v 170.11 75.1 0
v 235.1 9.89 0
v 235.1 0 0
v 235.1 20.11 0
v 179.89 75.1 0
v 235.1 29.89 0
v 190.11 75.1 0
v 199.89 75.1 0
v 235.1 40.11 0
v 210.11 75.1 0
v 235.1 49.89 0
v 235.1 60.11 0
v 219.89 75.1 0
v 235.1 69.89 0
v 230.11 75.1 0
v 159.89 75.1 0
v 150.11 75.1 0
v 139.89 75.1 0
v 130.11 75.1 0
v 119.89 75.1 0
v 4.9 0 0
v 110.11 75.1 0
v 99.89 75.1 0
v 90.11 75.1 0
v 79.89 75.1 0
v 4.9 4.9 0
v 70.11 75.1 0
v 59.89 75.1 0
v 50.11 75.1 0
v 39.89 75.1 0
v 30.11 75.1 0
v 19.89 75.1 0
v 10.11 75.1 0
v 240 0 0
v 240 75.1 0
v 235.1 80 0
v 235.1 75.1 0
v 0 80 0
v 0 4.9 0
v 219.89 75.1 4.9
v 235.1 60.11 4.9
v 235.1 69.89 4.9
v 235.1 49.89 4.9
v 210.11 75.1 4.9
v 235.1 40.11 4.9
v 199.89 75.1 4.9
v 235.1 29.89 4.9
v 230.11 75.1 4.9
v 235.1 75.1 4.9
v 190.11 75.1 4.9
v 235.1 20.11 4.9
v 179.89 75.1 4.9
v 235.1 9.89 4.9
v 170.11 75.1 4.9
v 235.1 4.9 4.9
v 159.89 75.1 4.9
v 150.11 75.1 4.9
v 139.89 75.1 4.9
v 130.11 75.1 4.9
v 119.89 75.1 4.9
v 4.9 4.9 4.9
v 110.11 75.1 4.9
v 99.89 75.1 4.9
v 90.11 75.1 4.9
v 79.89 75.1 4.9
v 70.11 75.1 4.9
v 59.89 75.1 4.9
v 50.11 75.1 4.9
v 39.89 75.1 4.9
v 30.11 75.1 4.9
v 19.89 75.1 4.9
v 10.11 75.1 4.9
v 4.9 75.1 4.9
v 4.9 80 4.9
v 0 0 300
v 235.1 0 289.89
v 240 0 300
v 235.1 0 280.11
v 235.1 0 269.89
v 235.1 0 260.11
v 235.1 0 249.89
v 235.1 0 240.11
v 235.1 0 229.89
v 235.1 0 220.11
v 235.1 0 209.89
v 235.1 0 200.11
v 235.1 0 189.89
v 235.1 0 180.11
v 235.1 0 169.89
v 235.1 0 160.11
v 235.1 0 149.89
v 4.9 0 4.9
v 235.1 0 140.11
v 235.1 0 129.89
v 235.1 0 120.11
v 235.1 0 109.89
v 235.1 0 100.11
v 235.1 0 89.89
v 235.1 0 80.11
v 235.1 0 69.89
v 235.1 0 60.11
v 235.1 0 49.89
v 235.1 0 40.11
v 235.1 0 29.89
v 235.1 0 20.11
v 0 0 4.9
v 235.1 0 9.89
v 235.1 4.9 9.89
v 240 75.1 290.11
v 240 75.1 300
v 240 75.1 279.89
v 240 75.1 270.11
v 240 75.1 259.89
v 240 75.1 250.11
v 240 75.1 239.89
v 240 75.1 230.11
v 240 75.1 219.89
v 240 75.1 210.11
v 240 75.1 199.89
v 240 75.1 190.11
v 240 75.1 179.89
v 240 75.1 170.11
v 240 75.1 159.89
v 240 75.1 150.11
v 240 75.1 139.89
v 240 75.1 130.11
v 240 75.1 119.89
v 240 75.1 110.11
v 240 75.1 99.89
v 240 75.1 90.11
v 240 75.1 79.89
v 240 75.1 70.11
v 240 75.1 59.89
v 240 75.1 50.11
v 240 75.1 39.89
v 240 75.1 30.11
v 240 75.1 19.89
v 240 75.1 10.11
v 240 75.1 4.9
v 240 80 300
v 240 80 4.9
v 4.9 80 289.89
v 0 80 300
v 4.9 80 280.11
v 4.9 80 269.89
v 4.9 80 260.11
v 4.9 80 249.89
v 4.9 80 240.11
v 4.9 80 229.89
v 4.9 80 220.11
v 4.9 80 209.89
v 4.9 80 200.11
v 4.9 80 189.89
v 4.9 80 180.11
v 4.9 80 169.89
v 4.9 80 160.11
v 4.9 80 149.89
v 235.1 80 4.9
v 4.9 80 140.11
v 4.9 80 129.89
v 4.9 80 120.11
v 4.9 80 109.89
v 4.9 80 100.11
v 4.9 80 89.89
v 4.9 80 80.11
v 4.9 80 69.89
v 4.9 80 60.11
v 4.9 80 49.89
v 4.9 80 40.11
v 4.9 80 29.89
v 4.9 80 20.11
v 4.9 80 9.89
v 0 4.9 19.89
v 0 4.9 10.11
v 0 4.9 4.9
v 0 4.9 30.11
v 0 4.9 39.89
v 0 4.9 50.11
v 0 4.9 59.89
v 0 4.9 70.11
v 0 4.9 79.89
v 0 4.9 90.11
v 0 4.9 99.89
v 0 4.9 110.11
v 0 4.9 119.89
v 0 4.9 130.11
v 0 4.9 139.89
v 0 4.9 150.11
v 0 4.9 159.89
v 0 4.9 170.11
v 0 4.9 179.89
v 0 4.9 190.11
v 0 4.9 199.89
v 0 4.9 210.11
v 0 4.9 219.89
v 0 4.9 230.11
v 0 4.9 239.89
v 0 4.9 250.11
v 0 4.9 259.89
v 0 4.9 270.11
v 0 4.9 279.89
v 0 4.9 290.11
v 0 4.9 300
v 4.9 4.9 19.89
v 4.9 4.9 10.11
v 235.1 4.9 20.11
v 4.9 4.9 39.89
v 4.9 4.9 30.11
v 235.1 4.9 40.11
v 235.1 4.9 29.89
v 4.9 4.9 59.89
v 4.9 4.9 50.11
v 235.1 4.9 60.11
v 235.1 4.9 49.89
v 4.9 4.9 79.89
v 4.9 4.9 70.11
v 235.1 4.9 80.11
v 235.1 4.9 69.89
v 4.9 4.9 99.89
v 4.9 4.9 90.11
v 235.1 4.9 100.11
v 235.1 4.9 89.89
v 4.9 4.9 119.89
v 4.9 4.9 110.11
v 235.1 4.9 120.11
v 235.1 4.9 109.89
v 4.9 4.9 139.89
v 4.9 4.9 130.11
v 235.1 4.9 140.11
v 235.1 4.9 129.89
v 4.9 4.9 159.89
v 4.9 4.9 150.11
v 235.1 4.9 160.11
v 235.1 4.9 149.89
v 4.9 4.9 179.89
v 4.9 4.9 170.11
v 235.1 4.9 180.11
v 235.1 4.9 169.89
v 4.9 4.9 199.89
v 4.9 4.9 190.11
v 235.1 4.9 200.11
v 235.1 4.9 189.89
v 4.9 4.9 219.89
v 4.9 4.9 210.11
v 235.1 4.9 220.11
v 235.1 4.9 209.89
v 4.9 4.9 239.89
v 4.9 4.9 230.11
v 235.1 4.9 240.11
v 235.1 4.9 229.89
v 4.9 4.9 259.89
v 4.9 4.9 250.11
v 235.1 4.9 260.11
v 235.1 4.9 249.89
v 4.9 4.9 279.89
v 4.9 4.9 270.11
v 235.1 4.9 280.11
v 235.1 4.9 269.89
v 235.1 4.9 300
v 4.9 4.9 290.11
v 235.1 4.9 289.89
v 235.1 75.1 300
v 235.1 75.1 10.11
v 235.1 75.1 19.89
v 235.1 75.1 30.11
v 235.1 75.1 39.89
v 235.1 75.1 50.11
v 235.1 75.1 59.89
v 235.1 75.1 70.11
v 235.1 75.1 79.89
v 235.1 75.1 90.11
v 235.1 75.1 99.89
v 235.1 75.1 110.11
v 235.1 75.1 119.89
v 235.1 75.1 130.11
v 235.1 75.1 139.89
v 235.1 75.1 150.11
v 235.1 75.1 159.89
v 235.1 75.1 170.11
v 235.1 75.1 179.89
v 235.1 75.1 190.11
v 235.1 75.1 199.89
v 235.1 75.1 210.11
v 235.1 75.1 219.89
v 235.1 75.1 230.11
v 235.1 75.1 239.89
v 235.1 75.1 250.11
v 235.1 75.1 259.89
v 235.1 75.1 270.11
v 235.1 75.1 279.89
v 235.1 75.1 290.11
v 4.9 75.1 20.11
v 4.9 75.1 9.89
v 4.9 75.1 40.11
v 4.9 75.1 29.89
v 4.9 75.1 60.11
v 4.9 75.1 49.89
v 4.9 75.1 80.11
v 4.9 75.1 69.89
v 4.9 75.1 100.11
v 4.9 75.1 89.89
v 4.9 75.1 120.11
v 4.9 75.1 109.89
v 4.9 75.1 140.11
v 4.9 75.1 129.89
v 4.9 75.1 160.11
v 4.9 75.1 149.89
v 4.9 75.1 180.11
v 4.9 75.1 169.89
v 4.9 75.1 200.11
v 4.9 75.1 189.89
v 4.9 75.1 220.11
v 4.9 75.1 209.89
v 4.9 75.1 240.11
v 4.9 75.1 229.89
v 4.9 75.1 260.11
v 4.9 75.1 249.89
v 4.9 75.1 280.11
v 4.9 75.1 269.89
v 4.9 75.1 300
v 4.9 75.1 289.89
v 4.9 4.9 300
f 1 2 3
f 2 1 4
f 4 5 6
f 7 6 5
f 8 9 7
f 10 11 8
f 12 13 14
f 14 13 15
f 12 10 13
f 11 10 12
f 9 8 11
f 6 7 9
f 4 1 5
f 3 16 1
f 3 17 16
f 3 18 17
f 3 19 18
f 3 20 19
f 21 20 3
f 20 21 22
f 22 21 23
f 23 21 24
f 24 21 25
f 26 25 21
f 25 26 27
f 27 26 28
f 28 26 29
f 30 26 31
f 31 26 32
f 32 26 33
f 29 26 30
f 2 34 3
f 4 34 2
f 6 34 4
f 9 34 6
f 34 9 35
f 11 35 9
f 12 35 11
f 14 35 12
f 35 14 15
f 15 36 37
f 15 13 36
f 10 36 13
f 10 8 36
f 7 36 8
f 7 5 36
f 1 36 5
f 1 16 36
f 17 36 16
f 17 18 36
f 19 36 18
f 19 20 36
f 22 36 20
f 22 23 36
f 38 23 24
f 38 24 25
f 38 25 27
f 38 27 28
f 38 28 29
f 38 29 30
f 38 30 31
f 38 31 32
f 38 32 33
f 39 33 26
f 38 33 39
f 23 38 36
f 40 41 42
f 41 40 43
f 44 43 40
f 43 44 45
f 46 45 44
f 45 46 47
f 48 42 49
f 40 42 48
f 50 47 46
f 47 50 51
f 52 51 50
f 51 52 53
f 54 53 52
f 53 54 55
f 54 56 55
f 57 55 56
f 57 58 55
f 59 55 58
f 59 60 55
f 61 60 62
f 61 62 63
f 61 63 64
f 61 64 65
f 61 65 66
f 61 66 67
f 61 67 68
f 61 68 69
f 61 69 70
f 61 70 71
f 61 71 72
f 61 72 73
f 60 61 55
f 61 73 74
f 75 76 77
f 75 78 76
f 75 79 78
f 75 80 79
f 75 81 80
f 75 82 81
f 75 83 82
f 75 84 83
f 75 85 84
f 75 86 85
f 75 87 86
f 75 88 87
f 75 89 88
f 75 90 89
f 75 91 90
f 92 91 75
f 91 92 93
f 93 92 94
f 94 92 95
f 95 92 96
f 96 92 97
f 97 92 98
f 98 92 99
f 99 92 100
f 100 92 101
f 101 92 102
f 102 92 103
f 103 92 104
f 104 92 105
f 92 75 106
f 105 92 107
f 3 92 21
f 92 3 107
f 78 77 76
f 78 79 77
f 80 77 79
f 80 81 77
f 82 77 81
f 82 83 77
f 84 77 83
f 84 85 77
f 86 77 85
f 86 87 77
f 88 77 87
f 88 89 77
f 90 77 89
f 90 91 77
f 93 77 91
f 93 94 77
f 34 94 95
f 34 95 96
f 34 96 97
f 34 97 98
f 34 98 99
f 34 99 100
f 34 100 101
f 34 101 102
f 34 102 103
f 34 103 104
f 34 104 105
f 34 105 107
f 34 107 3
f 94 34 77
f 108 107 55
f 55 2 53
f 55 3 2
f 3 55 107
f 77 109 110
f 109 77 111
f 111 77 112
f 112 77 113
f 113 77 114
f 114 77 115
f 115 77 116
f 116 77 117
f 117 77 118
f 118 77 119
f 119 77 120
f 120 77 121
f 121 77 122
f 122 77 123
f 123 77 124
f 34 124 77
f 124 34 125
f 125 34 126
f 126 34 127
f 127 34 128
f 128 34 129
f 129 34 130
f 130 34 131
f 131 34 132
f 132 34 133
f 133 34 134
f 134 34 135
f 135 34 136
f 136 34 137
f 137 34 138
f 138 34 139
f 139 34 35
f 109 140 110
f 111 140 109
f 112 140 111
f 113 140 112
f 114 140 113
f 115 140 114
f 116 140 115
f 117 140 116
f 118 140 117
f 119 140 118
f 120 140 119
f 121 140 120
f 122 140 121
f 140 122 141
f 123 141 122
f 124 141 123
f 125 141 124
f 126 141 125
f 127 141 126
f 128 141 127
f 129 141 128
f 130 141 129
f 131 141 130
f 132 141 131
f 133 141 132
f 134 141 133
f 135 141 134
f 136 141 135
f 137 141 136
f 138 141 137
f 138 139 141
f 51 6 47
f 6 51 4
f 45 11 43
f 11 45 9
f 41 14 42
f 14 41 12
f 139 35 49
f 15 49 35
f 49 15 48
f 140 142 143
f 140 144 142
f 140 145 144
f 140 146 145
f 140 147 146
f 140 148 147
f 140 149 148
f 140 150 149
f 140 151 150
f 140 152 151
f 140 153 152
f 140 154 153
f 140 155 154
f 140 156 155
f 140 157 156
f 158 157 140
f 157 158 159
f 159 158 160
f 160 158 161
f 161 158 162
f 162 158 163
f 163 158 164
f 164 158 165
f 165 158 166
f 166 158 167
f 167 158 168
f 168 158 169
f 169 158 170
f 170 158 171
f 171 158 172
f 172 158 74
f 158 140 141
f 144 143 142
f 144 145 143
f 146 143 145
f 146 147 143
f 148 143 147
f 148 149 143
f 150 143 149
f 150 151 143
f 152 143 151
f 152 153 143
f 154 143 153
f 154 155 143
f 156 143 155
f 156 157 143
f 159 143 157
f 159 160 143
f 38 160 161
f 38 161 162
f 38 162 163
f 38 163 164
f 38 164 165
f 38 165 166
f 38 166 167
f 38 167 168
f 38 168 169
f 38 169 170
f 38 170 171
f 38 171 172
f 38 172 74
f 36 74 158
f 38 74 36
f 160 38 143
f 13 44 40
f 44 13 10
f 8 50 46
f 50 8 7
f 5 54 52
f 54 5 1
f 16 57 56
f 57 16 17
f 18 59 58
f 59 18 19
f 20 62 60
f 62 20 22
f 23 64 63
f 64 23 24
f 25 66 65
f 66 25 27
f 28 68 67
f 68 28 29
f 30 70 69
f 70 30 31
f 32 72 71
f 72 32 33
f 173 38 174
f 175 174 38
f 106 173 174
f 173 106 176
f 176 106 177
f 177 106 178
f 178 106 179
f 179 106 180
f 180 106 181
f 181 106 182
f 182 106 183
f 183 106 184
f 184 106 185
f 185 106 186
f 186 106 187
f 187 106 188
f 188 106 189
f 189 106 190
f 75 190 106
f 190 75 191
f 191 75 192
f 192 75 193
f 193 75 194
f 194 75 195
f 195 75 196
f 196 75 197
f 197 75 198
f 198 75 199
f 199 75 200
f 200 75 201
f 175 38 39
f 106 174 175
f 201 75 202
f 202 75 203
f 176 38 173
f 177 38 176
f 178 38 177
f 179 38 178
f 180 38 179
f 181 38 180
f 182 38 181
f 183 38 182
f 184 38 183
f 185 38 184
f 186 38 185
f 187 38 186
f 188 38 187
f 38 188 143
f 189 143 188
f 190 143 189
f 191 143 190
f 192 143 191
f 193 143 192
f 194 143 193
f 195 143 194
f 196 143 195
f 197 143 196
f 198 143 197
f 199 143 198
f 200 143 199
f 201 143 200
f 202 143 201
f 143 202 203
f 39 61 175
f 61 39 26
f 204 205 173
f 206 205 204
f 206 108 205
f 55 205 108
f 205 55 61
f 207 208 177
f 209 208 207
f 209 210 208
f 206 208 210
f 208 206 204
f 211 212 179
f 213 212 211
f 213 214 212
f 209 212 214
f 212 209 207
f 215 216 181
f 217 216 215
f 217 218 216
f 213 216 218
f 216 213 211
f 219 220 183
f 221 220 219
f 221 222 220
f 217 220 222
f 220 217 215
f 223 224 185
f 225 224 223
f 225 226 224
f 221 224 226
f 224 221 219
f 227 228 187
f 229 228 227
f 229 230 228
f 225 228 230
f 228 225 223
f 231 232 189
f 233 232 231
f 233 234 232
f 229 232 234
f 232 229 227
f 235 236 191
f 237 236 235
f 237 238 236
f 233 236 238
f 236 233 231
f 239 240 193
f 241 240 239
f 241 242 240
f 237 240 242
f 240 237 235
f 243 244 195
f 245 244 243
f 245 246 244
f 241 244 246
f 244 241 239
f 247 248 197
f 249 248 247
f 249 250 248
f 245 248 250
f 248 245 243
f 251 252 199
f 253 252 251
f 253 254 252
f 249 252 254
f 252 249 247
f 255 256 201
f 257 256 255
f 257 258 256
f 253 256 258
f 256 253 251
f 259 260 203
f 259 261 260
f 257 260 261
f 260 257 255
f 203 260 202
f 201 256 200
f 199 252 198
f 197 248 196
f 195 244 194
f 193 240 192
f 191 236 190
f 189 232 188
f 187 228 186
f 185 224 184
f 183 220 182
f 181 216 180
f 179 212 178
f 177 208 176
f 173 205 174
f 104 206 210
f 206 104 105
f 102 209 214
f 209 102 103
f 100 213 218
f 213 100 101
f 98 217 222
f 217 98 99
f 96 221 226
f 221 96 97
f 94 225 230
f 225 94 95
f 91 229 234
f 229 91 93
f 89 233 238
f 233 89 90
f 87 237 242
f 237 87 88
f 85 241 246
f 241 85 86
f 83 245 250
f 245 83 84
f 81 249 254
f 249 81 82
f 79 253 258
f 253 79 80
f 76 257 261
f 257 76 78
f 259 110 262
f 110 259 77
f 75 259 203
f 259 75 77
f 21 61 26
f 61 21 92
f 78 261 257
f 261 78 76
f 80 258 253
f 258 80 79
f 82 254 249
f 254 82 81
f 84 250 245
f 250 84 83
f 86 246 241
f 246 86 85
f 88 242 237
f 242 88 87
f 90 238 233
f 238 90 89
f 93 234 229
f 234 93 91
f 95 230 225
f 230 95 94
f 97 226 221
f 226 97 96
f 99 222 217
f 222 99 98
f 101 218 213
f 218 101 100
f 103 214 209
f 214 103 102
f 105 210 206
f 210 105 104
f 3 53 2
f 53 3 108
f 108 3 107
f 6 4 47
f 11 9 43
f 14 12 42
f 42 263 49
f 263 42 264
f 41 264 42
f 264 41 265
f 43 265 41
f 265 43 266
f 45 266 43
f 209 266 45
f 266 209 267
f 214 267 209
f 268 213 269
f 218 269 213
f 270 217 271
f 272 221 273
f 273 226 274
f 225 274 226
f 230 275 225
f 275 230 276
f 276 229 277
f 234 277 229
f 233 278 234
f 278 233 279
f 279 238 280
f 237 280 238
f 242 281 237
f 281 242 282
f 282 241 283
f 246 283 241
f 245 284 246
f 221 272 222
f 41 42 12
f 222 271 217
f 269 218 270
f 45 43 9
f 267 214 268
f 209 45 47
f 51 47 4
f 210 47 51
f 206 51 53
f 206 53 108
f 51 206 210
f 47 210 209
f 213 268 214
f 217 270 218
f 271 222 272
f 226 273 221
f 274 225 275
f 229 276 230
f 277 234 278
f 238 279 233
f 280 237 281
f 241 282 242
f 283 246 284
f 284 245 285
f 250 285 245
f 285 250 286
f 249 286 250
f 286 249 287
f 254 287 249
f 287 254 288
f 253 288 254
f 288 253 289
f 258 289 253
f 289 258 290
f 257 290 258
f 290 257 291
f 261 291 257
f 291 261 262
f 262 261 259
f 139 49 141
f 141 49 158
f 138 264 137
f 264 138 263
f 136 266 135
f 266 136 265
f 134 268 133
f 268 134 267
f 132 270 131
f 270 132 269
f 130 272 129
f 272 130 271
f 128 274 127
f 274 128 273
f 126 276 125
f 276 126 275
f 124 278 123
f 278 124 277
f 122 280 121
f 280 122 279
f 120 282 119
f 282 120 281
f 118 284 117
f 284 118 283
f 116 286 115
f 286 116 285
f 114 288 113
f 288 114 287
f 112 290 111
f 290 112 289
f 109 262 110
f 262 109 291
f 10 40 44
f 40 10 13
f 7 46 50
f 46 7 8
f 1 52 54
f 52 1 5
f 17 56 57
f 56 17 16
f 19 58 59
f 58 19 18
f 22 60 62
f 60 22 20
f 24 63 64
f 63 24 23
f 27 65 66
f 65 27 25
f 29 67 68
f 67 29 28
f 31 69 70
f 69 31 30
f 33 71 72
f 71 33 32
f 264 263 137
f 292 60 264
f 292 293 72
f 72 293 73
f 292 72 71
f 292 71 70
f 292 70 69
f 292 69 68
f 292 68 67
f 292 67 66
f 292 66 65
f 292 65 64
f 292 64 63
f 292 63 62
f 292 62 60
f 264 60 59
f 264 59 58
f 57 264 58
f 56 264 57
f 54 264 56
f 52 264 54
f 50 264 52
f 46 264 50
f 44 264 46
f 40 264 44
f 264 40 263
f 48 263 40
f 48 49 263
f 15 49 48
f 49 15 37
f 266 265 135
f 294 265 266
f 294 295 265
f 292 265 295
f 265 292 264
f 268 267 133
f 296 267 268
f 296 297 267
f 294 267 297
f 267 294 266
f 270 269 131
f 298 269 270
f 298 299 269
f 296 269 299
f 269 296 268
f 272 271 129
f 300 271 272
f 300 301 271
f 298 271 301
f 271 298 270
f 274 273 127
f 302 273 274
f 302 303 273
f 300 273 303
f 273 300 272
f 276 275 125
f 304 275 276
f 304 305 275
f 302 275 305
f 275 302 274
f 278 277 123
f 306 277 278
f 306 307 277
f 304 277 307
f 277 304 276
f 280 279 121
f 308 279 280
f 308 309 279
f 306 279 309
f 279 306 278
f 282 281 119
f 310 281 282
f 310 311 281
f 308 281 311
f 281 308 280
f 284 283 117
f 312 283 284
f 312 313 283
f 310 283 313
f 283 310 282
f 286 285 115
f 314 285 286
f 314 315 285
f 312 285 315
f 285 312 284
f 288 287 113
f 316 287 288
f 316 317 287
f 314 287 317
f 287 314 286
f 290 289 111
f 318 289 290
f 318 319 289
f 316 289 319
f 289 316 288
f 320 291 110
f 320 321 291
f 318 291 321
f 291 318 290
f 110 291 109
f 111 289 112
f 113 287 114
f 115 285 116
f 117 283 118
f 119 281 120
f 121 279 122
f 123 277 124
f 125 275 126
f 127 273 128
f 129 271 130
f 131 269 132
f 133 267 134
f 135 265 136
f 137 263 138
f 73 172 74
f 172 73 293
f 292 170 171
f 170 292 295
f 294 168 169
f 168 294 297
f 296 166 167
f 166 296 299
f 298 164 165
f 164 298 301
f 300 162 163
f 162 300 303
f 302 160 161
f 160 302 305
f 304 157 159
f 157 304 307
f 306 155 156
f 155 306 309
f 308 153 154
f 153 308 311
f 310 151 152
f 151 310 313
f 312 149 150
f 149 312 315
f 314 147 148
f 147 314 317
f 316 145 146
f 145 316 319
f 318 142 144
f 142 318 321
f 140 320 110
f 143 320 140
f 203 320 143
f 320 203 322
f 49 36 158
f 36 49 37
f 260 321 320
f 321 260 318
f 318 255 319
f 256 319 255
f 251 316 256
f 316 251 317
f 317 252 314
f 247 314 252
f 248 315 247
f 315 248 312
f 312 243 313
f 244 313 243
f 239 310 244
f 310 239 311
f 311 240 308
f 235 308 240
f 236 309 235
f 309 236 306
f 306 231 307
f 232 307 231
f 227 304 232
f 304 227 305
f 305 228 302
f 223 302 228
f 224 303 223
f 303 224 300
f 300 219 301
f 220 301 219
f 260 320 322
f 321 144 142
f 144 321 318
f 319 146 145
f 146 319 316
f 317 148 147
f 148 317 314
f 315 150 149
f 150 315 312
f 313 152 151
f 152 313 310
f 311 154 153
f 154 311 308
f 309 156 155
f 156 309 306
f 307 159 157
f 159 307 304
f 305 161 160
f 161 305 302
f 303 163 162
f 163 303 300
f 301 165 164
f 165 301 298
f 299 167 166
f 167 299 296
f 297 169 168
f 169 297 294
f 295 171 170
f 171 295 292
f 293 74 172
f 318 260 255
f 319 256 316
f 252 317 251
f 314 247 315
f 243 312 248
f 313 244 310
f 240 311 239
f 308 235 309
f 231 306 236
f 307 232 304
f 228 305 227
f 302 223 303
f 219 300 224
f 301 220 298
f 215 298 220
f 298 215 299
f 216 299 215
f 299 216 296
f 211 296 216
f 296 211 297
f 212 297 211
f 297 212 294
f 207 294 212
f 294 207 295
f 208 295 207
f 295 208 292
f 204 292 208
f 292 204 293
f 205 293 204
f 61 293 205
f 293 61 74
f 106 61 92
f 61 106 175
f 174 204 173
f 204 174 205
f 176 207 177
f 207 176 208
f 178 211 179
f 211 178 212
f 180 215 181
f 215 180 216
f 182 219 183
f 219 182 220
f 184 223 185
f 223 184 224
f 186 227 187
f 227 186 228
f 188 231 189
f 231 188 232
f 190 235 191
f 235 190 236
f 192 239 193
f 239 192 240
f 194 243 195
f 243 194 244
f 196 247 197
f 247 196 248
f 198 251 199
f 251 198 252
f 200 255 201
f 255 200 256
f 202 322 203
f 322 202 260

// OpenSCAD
union() {
	union() {
		linear_extrude(height = 4.9000000000) {
			union() {
				difference() {
					polygon(points = [[235.1000000000, 69.8900000000], [235.1000000000, 60.1100000000], [240.0000000000, 60.1100000000], [240.0000000000, 49.8900000000], [235.1000000000, 49.8900000000], [235.1000000000, 40.1100000000], [240.0000000000, 40.1100000000], [240.0000000000, 29.8900000000], [235.1000000000, 29.8900000000], [235.1000000000, 20.1100000000], [240.0000000000, 20.1100000000], [240.0000000000, 9.8900000000], [235.1000000000, 9.8900000000], [235.1000000000, 0.0000000000], [229.8900000000, 0.0000000000], [229.8900000000, 4.9000000000], [220.1100000000, 4.9000000000], [220.1100000000, 0.0000000000], [209.8900000000, 0.0000000000], [209.8900000000, 4.9000000000], [200.1100000000, 4.9000000000], [200.1100000000, 0.0000000000], [189.8900000000, 0.0000000000], [189.8900000000, 4.9000000000], [180.1100000000, 4.9000000000], [180.1100000000, 0.0000000000], [169.8900000000, 0.0000000000], [169.8900000000, 4.9000000000], [160.1100000000, 4.9000000000], [160.1100000000, 0.0000000000], [149.8900000000, 0.0000000000], [149.8900000000, 4.9000000000], [140.1100000000, 4.9000000000], [140.1100000000, 0.0000000000], [129.8900000000, 0.0000000000], [129.8900000000, 4.9000000000], [120.1100000000, 4.9000000000], [120.1100000000, 0.0000000000], [109.8900000000, 0.0000000000], [109.8900000000, 4.9000000000], [100.1100000000, 4.9000000000], [100.1100000000, 0.0000000000], [89.8900000000, 0.0000000000], [89.8900000000, 4.9000000000], [80.1100000000, 4.9000000000], [80.1100000000, 0.0000000000], [69.8900000000, 0.0000000000], [69.8900000000, 4.9000000000], [60.1100000000, 4.9000000000], [60.1100000000, 0.0000000000], [49.8900000000, 0.0000000000], [49.8900000000, 4.9000000000], [40.1100000000, 4.9000000000], [40.1100000000, 0.0000000000], [29.8900000000, 0.0000000000], [29.8900000000, 4.9000000000], [20.1100000000, 4.9000000000], [20.1100000000, 0.0000000000], [9.8900000000, 0.0000000000], [9.8900000000, 4.9000000000], [0.0000000000, 4.9000000000], [0.0000000000, 10.1100000000], [4.9000000000, 10.1100000000], [4.9000000000, 19.8900000000], [0.0000000000, 19.8900000000], [0.0000000000, 30.1100000000], [4.9000000000, 30.1100000000], [4.9000000000, 39.8900000000], [0.0000000000, 39.8900000000], [0.0000000000, 50.1100000000], [4.9000000000, 50.1100000000], [4.9000000000, 59.8900000000], [0.0000000000, 59.8900000000], [0.0000000000, 70.1100000000], [4.9000000000, 70.1100000000], [4.9000000000, 80.0000000000], [10.1100000000, 80.0000000000], [10.1100000000, 75.1000000000], [19.8900000000, 75.1000000000], [19.8900000000, 80.0000000000], [30.1100000000, 80.0000000000], [30.1100000000, 75.1000000000], [39.8900000000, 75.1000000000], [39.8900000000, 80.0000000000], [50.1100000000, 80.0000000000], [50.1100000000, 75.1000000000], [59.8900000000, 75.1000000000], [59.8900000000, 80.0000000000], [70.1100000000, 80.0000000000], [70.1100000000, 75.1000000000], [79.8900000000, 75.1000000000], [79.8900000000, 80.0000000000], [90.1100000000, 80.0000000000], [90.1100000000, 75.1000000000], [99.8900000000, 75.1000000000], [99.8900000000, 80.0000000000], [110.1100000000, 80.0000000000], [110.1100000000, 75.1000000000], [119.8900000000, 75.1000000000], [119.8900000000, 80.0000000000], [130.1100000000, 80.0000000000], [130.1100000000, 75.1000000000], [139.8900000000, 75.1000000000], [139.8900000000, 80.0000000000], [150.1100000000, 80.0000000000], [150.1100000000, 75.1000000000], [159.8900000000, 75.1000000000], [159.8900000000, 80.0000000000], [170.1100000000, 80.0000000000], [170.1100000000, 75.1000000000], [179.8900000000, 75.1000000000], [179.8900000000, 80.0000000000], [190.1100000000, 80.0000000000], [190.1100000000, 75.1000000000], [199.8900000000, 75.1000000000], [199.8900000000, 80.0000000000], [210.1100000000, 80.0000000000], [210.1100000000, 75.1000000000], [219.8900000000, 75.1000000000], [219.8900000000, 80.0000000000], [230.1100000000, 80.0000000000], [230.1100000000, 75.1000000000], [240.0000000000, 75.1000000000], [240.0000000000, 69.8900000000], [235.1000000000, 69.8900000000]]);
				}
			}
		}
	}
	union() {
		color(alpha = 1.0000000000, c = [0.8000000000, 0.5000000000, 0.2000000000]) {
			translate(v = [0, 4.9000000000, 0]) {
				rotate(a = 90, v = [1, 0, 0]) {
					linear_extrude(height = 4.9000000000) {
						union() {
							difference() {
								polygon(points = [[240.0000000000, 300.0000000000], [240.0000000000, 289.8900000000], [235.1000000000, 289.8900000000], [235.1000000000, 280.1100000000], [240.0000000000, 280.1100000000], [240.0000000000, 269.8900000000], [235.1000000000, 269.8900000000], [235.1000000000, 260.1100000000], [240.0000000000, 260.1100000000], [240.0000000000, 249.8900000000], [235.1000000000, 249.8900000000], [235.1000000000, 240.1100000000], [240.0000000000, 240.1100000000], [240.0000000000, 229.8900000000], [235.1000000000, 229.8900000000], [235.1000000000, 220.1100000000], [240.0000000000, 220.1100000000], [240.0000000000, 209.8900000000], [235.1000000000, 209.8900000000], [235.1000000000, 200.1100000000], [240.0000000000, 200.1100000000], [240.0000000000, 189.8900000000], [235.1000000000, 189.8900000000], [235.1000000000, 180.1100000000], [240.0000000000, 180.1100000000], [240.0000000000, 169.8900000000], [235.1000000000, 169.8900000000], [235.1000000000, 160.1100000000], [240.0000000000, 160.1100000000], [240.0000000000, 149.8900000000], [235.1000000000, 149.8900000000], [235.1000000000, 140.1100000000], [240.0000000000, 140.1100000000], [240.0000000000, 129.8900000000], [235.1000000000, 129.8900000000], [235.1000000000, 120.1100000000], [240.0000000000, 120.1100000000], [240.0000000000, 109.8900000000], [235.1000000000, 109.8900000000], [235.1000000000, 100.1100000000], [240.0000000000, 100.1100000000], [240.0000000000, 89.8900000000], [235.1000000000, 89.8900000000], [235.1000000000, 80.1100000000], [240.0000000000, 80.1100000000], [240.0000000000, 69.8900000000], [235.1000000000, 69.8900000000], [235.1000000000, 60.1100000000], [240.0000000000, 60.1100000000], [240.0000000000, 49.8900000000], [235.1000000000, 49.8900000000], [235.1000000000, 40.1100000000], [240.0000000000, 40.1100000000], [240.0000000000, 29.8900000000], [235.1000000000, 29.8900000000], [235.1000000000, 20.1100000000], [240.0000000000, 20.1100000000], [240.0000000000, 9.8900000000], [235.1000000000, 9.8900000000], [235.1000000000, 4.9000000000], [230.1100000000, 4.9000000000], [230.1100000000, 0.0000000000], [219.8900000000, 0.0000000000], [219.8900000000, 4.9000000000], [210.1100000000, 4.9000000000], [210.1100000000, 0.0000000000], [199.8900000000, 0.0000000000], [199.8900000000, 4.9000000000], [190.1100000000, 4.9000000000], [190.1100000000, 0.0000000000], [179.8900000000, 0.0000000000], [179.8900000000, 4.9000000000], [170.1100000000, 4.9000000000], [170.1100000000, 0.0000000000], [159.8900000000, 0.0000000000], [159.8900000000, 4.9000000000], [150.1100000000, 4.9000000000], [150.1100000000, 0.0000000000], [139.8900000000, 0.0000000000], [139.8900000000, 4.9000000000], [130.1100000000, 4.9000000000], [130.1100000000, 0.0000000000], [119.8900000000, 0.0000000000], [119.8900000000, 4.9000000000], [110.1100000000, 4.9000000000], [110.1100000000, 0.0000000000], [99.8900000000, 0.0000000000], [99.8900000000, 4.9000000000], [90.1100000000, 4.9000000000], [90.1100000000, 0.0000000000], [79.8900000000, 0.0000000000], [79.8900000000, 4.9000000000], [70.1100000000, 4.9000000000], [70.1100000000, 0.0000000000], [59.8900000000, 0.0000000000], [59.8900000000, 4.9000000000], [50.1100000000, 4.9000000000], [50.1100000000, 0.0000000000], [39.8900000000, 0.0000000000], [39.8900000000, 4.9000000000], [30.1100000000, 4.9000000000], [30.1100000000, 0.0000000000], [19.8900000000, 0.0000000000], [19.8900000000, 4.9000000000], [10.1100000000, 4.9000000000], [10.1100000000, 0.0000000000], [4.9000000000, 0.0000000000], [4.9000000000, 9.8900000000], [0.0000000000, 9.8900000000], [0.0000000000, 20.1100000000], [4.9000000000, 20.1100000000], [4.9000000000, 29.8900000000], [0.0000000000, 29.8900000000], [0.0000000000, 40.1100000000], [4.9000000000, 40.1100000000], [4.9000000000, 49.8900000000], [0.0000000000, 49.8900000000], [0.0000000000, 60.1100000000], [4.9000000000, 60.1100000000], [4.9000000000, 69.8900000000], [0.0000000000, 69.8900000000], [0.0000000000, 80.1100000000], [4.9000000000, 80.1100000000], [4.9000000000, 89.8900000000], [0.0000000000, 89.8900000000], [0.0000000000, 100.1100000000], [4.9000000000, 100.1100000000], [4.9000000000, 109.8900000000], [0.0000000000, 109.8900000000], [0.0000000000, 120.1100000000], [4.9000000000, 120.1100000000], [4.9000000000, 129.8900000000], [0.0000000000, 129.8900000000], [0.0000000000, 140.1100000000], [4.9000000000, 140.1100000000], [4.9000000000, 149.8900000000], [0.0000000000, 149.8900000000], [0.0000000000, 160.1100000000], [4.9000000000, 160.1100000000], [4.9000000000, 169.8900000000], [0.0000000000, 169.8900000000], [0.0000000000, 180.1100000000], [4.9000000000, 180.1100000000], [4.9000000000, 189.8900000000], [0.0000000000, 189.8900000000], [0.0000000000, 200.1100000000], [4.9000000000, 200.1100000000], [4.9000000000, 209.8900000000], [0.0000000000, 209.8900000000], [0.0000000000, 220.1100000000], [4.9000000000, 220.1100000000], [4.9000000000, 229.8900000000], [0.0000000000, 229.8900000000], [0.0000000000, 240.1100000000], [4.9000000000, 240.1100000000], [4.9000000000, 249.8900000000], [0.0000000000, 249.8900000000], [0.0000000000, 260.1100000000], [4.9000000000, 260.1100000000], [4.9000000000, 269.8900000000], [0.0000000000, 269.8900000000], [0.0000000000, 280.1100000000], [4.9000000000, 280.1100000000], [4.9000000000, 289.8900000000], [0.0000000000, 289.8900000000], [0.0000000000, 300.0000000000], [240.0000000000, 300.0000000000]]);
							}
						}
					}
				}
			}
		}
	}
	union() {
		color(alpha = 1.0000000000, c = [0.7000000000, 0.4000000000, 0.1000000000]) {
			translate(v = [235.1000000000, 0, 0]) {
				rotate(a = 90, v = [0, 0, 1]) {
					rotate(a = 90, v = [1, 0, 0]) {
						linear_extrude(height = 4.9000000000) {
							union() {
								difference() {
									polygon(points = [[75.1000000000, 300.0000000000], [75.1000000000, 290.1100000000], [80.0000000000, 290.1100000000], [80.0000000000, 279.8900000000], [75.1000000000, 279.8900000000], [75.1000000000, 270.1100000000], [80.0000000000, 270.1100000000], [80.0000000000, 259.8900000000], [75.1000000000, 259.8900000000], [75.1000000000, 250.1100000000], [80.0000000000, 250.1100000000], [80.0000000000, 239.8900000000], [75.1000000000, 239.8900000000], [75.1000000000, 230.1100000000], [80.0000000000, 230.1100000000], [80.0000000000, 219.8900000000], [75.1000000000, 219.8900000000], [75.1000000000, 210.1100000000], [80.0000000000, 210.1100000000], [80.0000000000, 199.8900000000], [75.1000000000, 199.8900000000], [75.1000000000, 190.1100000000], [80.0000000000, 190.1100000000], [80.0000000000, 179.8900000000], [75.1000000000, 179.8900000000], [75.1000000000, 170.1100000000], [80.0000000000, 170.1100000000], [80.0000000000, 159.8900000000], [75.1000000000, 159.8900000000], [75.1000000000, 150.1100000000], [80.0000000000, 150.1100000000], [80.0000000000, 139.8900000000], [75.1000000000, 139.8900000000], [75.1000000000, 130.1100000000], [80.0000000000, 130.1100000000], [80.0000000000, 119.8900000000], [75.1000000000, 119.8900000000], [75.1000000000, 110.1100000000], [80.0000000000, 110.1100000000], [80.0000000000, 99.8900000000], [75.1000000000, 99.8900000000], [75.1000000000, 90.1100000000], [80.0000000000, 90.1100000000], [80.0000000000, 79.8900000000], [75.1000000000, 79.8900000000], [75.1000000000, 70.1100000000], [80.0000000000, 70.1100000000], [80.0000000000, 59.8900000000], [75.1000000000, 59.8900000000], [75.1000000000, 50.1100000000], [80.0000000000, 50.1100000000], [80.0000000000, 39.8900000000], [75.1000000000, 39.8900000000], [75.1000000000, 30.1100000000], [80.0000000000, 30.1100000000], [80.0000000000, 19.8900000000], [75.1000000000, 19.8900000000], [75.1000000000, 10.1100000000], [80.0000000000, 10.1100000000], [80.0000000000, 4.9000000000], [70.1100000000, 4.9000000000], [70.1100000000, 0.0000000000], [59.8900000000, 0.0000000000], [59.8900000000, 4.9000000000], [50.1100000000, 4.9000000000], [50.1100000000, 0.0000000000], [39.8900000000, 0.0000000000], [39.8900000000, 4.9000000000], [30.1100000000, 4.9000000000], [30.1100000000, 0.0000000000], [19.8900000000, 0.0000000000], [19.8900000000, 4.9000000000], [10.1100000000, 4.9000000000], [10.1100000000, 0.0000000000], [0.0000000000, 0.0000000000], [0.0000000000, 10.1100000000], [4.9000000000, 10.1100000000], [4.9000000000, 19.8900000000], [0.0000000000, 19.8900000000], [0.0000000000, 30.1100000000], [4.9000000000, 30.1100000000], [4.9000000000, 39.8900000000], [0.0000000000, 39.8900000000], [0.0000000000, 50.1100000000], [4.9000000000, 50.1100000000], [4.9000000000, 59.8900000000], [0.0000000000, 59.8900000000], [0.0000000000, 70.1100000000], [4.9000000000, 70.1100000000], [4.9000000000, 79.8900000000], [0.0000000000, 79.8900000000], [0.0000000000, 90.1100000000], [4.9000000000, 90.1100000000], [4.9000000000, 99.8900000000], [0.0000000000, 99.8900000000], [0.0000000000, 110.1100000000], [4.9000000000, 110.1100000000], [4.9000000000, 119.8900000000], [0.0000000000, 119.8900000000], [0.0000000000, 130.1100000000], [4.9000000000, 130.1100000000], [4.9000000000, 139.8900000000], [0.0000000000, 139.8900000000], [0.0000000000, 150.1100000000], [4.9000000000, 150.1100000000], [4.9000000000, 159.8900000000], [0.0000000000, 159.8900000000], [0.0000000000, 170.1100000000], [4.9000000000, 170.1100000000], [4.9000000000, 179.8900000000], [0.0000000000, 179.8900000000], [0.0000000000, 190.1100000000], [4.9000000000, 190.1100000000], [4.9000000000, 199.8900000000], [0.0000000000, 199.8900000000], [0.0000000000, 210.1100000000], [4.9000000000, 210.1100000000], [4.9000000000, 219.8900000000], [0.0000000000, 219.8900000000], [0.0000000000, 230.1100000000], [4.9000000000, 230.1100000000], [4.9000000000, 239.8900000000], [0.0000000000, 239.8900000000], [0.0000000000, 250.1100000000], [4.9000000000, 250.1100000000], [4.9000000000, 259.8900000000], [0.0000000000, 259.8900000000], [0.0000000000, 270.1100000000], [4.9000000000, 270.1100000000], [4.9000000000, 279.8900000000], [0.0000000000, 279.8900000000], [0.0000000000, 290.1100000000], [4.9000000000, 290.1100000000], [4.9000000000, 300.0000000000], [75.1000000000, 300.0000000000]]);
								}
							}
						}
					}
				}
			}
		}
	}
	union() {
		color(alpha = 1.0000000000, c = [0.8000000000, 0.5000000000, 0.2000000000]) {
			translate(v = [240, 75.1000000000, 0]) {
				rotate(a = 180, v = [0, 0, 1]) {
					rotate(a = 90, v = [1, 0, 0]) {
						linear_extrude(height = 4.9000000000) {
							union() {
								difference() {
									polygon(points = [[240.0000000000, 300.0000000000], [240.0000000000, 289.8900000000], [235.1000000000, 289.8900000000], [235.1000000000, 280.1100000000], [240.0000000000, 280.1100000000], [240.0000000000, 269.8900000000], [235.1000000000, 269.8900000000], [235.1000000000, 260.1100000000], [240.0000000000, 260.1100000000], [240.0000000000, 249.8900000000], [235.1000000000, 249.8900000000], [235.1000000000, 240.1100000000], [240.0000000000, 240.1100000000], [240.0000000000, 229.8900000000], [235.1000000000, 229.8900000000], [235.1000000000, 220.1100000000], [240.0000000000, 220.1100000000], [240.0000000000, 209.8900000000], [235.1000000000, 209.8900000000], [235.1000000000, 200.1100000000], [240.0000000000, 200.1100000000], [240.0000000000, 189.8900000000], [235.1000000000, 189.8900000000], [235.1000000000, 180.1100000000], [240.0000000000, 180.1100000000], [240.0000000000, 169.8900000000], [235.1000000000, 169.8900000000], [235.1000000000, 160.1100000000], [240.0000000000, 160.1100000000], [240.0000000000, 149.8900000000], [235.1000000000, 149.8900000000], [235.1000000000, 140.1100000000], [240.0000000000, 140.1100000000], [240.0000000000, 129.8900000000], [235.1000000000, 129.8900000000], [235.1000000000, 120.1100000000], [240.0000000000, 120.1100000000], [240.0000000000, 109.8900000000], [235.1000000000, 109.8900000000], [235.1000000000, 100.1100000000], [240.0000000000, 100.1100000000], [240.0000000000, 89.8900000000], [235.1000000000, 89.8900000000], [235.1000000000, 80.1100000000], [240.0000000000, 80.1100000000], [240.0000000000, 69.8900000000], [235.1000000000, 69.8900000000], [235.1000000000, 60.1100000000], [240.0000000000, 60.1100000000], [240.0000000000, 49.8900000000], [235.1000000000, 49.8900000000], [235.1000000000, 40.1100000000], [240.0000000000, 40.1100000000], [240.0000000000, 29.8900000000], [235.1000000000, 29.8900000000], [235.1000000000, 20.1100000000], [240.0000000000, 20.1100000000], [240.0000000000, 9.8900000000], [235.1000000000, 9.8900000000], [235.1000000000, 4.9000000000], [230.1100000000, 4.9000000000], [230.1100000000, 0.0000000000], [219.8900000000, 0.0000000000], [219.8900000000, 4.9000000000], [210.1100000000, 4.9000000000], [210.1100000000, 0.0000000000], [199.8900000000, 0.0000000000], [199.8900000000, 4.9000000000], [190.1100000000, 4.9000000000], [190.1100000000, 0.0000000000], [179.8900000000, 0.0000000000], [179.8900000000, 4.9000000000], [170.1100000000, 4.9000000000], [170.1100000000, 0.0000000000], [159.8900000000, 0.0000000000], [159.8900000000, 4.9000000000], [150.1100000000, 4.9000000000], [150.1100000000, 0.0000000000], [139.8900000000, 0.0000000000], [139.8900000000, 4.9000000000], [130.1100000000, 4.9000000000], [130.1100000000, 0.0000000000], [119.8900000000, 0.0000000000], [119.8900000000, 4.9000000000], [110.1100000000, 4.9000000000], [110.1100000000, 0.0000000000], [99.8900000000, 0.0000000000], [99.8900000000, 4.9000000000], [90.1100000000, 4.9000000000], [90.1100000000, 0.0000000000], [79.8900000000, 0.0000000000], [79.8900000000, 4.9000000000], [70.1100000000, 4.9000000000], [70.1100000000, 0.0000000000], [59.8900000000, 0.0000000000], [59.8900000000, 4.9000000000], [50.1100000000, 4.9000000000], [50.1100000000, 0.0000000000], [39.8900000000, 0.0000000000], [39.8900000000, 4.9000000000], [30.1100000000, 4.9000000000], [30.1100000000, 0.0000000000], [19.8900000000, 0.0000000000], [19.8900000000, 4.9000000000], [10.1100000000, 4.9000000000], [10.1100000000, 0.0000000000], [4.9000000000, 0.0000000000], [4.9000000000, 9.8900000000], [0.0000000000, 9.8900000000], [0.0000000000, 20.1100000000], [4.9000000000, 20.1100000000], [4.9000000000, 29.8900000000], [0.0000000000, 29.8900000000], [0.0000000000, 40.1100000000], [4.9000000000, 40.1100000000], [4.9000000000, 49.8900000000], [0.0000000000, 49.8900000000], [0.0000000000, 60.1100000000], [4.9000000000, 60.1100000000], [4.9000000000, 69.8900000000], [0.0000000000, 69.8900000000], [0.0000000000, 80.1100000000], [4.9000000000, 80.1100000000], [4.9000000000, 89.8900000000], [0.0000000000, 89.8900000000], [0.0000000000, 100.1100000000], [4.9000000000, 100.1100000000], [4.9000000000, 109.8900000000], [0.0000000000, 109.8900000000], [0.0000000000, 120.1100000000], [4.9000000000, 120.1100000000], [4.9000000000, 129.8900000000], [0.0000000000, 129.8900000000], [0.0000000000, 140.1100000000], [4.9000000000, 140.1100000000], [4.9000000000, 149.8900000000], [0.0000000000, 149.8900000000], [0.0000000000, 160.1100000000], [4.9000000000, 160.1100000000], [4.9000000000, 169.8900000000], [0.0000000000, 169.8900000000], [0.0000000000, 180.1100000000], [4.9000000000, 180.1100000000], [4.9000000000, 189.8900000000], [0.0000000000, 189.8900000000], [0.0000000000, 200.1100000000], [4.9000000000, 200.1100000000], [4.9000000000, 209.8900000000], [0.0000000000, 209.8900000000], [0.0000000000, 220.1100000000], [4.9000000000, 220.1100000000], [4.9000000000, 229.8900000000], [0.0000000000, 229.8900000000], [0.0000000000, 240.1100000000], [4.9000000000, 240.1100000000], [4.9000000000, 249.8900000000], [0.0000000000, 249.8900000000], [0.0000000000, 260.1100000000], [4.9000000000, 260.1100000000], [4.9000000000, 269.8900000000], [0.0000000000, 269.8900000000], [0.0000000000, 280.1100000000], [4.9000000000, 280.1100000000], [4.9000000000, 289.8900000000], [0.0000000000, 289.8900000000], [0.0000000000, 300.0000000000], [240.0000000000, 300.0000000000]]);
								}
							}
						}
					}
				}
			}
		}
	}
	union() {
		color(alpha = 1.0000000000, c = [0.7000000000, 0.4000000000, 0.1000000000]) {
			translate(v = [4.9000000000, 80, 0]) {
				rotate(a = 270, v = [0, 0, 1]) {
					rotate(a = 90, v = [1, 0, 0]) {
						linear_extrude(height = 4.9000000000) {
							union() {
								difference() {
									polygon(points = [[75.1000000000, 300.0000000000], [75.1000000000, 290.1100000000], [80.0000000000, 290.1100000000], [80.0000000000, 279.8900000000], [75.1000000000, 279.8900000000], [75.1000000000, 270.1100000000], [80.0000000000, 270.1100000000], [80.0000000000, 259.8900000000], [75.1000000000, 259.8900000000], [75.1000000000, 250.1100000000], [80.0000000000, 250.1100000000], [80.0000000000, 239.8900000000], [75.1000000000, 239.8900000000], [75.1000000000, 230.1100000000], [80.0000000000, 230.1100000000], [80.0000000000, 219.8900000000], [75.1000000000, 219.8900000000], [75.1000000000, 210.1100000000], [80.0000000000, 210.1100000000], [80.0000000000, 199.8900000000], [75.1000000000, 199.8900000000], [75.1000000000, 190.1100000000], [80.0000000000, 190.1100000000], [80.0000000000, 179.8900000000], [75.1000000000, 179.8900000000], [75.1000000000, 170.1100000000], [80.0000000000, 170.1100000000], [80.0000000000, 159.8900000000], [75.1000000000, 159.8900000000], [75.1000000000, 150.1100000000], [80.0000000000, 150.1100000000], [80.0000000000, 139.8900000000], [75.1000000000, 139.8900000000], [75.1000000000, 130.1100000000], [80.0000000000, 130.1100000000], [80.0000000000, 119.8900000000], [75.1000000000, 119.8900000000], [75.1000000000, 110.1100000000], [80.0000000000, 110.1100000000], [80.0000000000, 99.8900000000], [75.1000000000, 99.8900000000], [75.1000000000, 90.1100000000], [80.0000000000, 90.1100000000], [80.0000000000, 79.8900000000], [75.1000000000, 79.8900000000], [75.1000000000, 70.1100000000], [80.0000000000, 70.1100000000], [80.0000000000, 59.8900000000], [75.1000000000, 59.8900000000], [75.1000000000, 50.1100000000], [80.0000000000, 50.1100000000], [80.0000000000, 39.8900000000], [75.1000000000, 39.8900000000], [75.1000000000, 30.1100000000], [80.0000000000, 30.1100000000], [80.0000000000, 19.8900000000], [75.1000000000, 19.8900000000], [75.1000000000, 10.1100000000], [80.0000000000, 10.1100000000], [80.0000000000, 4.9000000000], [70.1100000000, 4.9000000000], [70.1100000000, 0.0000000000], [59.8900000000, 0.0000000000], [59.8900000000, 4.9000000000], [50.1100000000, 4.9000000000], [50.1100000000, 0.0000000000], [39.8900000000, 0.0000000000], [39.8900000000, 4.9000000000], [30.1100000000, 4.9000000000], [30.1100000000, 0.0000000000], [19.8900000000, 0.0000000000], [19.8900000000, 4.9000000000], [10.1100000000, 4.9000000000], [10.1100000000, 0.0000000000], [0.0000000000, 0.0000000000], [0.0000000000, 10.1100000000], [4.9000000000, 10.1100000000], [4.9000000000, 19.8900000000], [0.0000000000, 19.8900000000], [0.0000000000, 30.1100000000], [4.9000000000, 30.1100000000], [4.9000000000, 39.8900000000], [0.0000000000, 39.8900000000], [0.0000000000, 50.1100000000], [4.9000000000, 50.1100000000], [4.9000000000, 59.8900000000], [0.0000000000, 59.8900000000], [0.0000000000, 70.1100000000], [4.9000000000, 70.1100000000], [4.9000000000, 79.8900000000], [0.0000000000, 79.8900000000], [0.0000000000, 90.1100000000], [4.9000000000, 90.1100000000], [4.9000000000, 99.8900000000], [0.0000000000, 99.8900000000], [0.0000000000, 110.1100000000], [4.9000000000, 110.1100000000], [4.9000000000, 119.8900000000], [0.0000000000, 119.8900000000], [0.0000000000, 130.1100000000], [4.9000000000, 130.1100000000], [4.9000000000, 139.8900000000], [0.0000000000, 139.8900000000], [0.0000000000, 150.1100000000], [4.9000000000, 150.1100000000], [4.9000000000, 159.8900000000], [0.0000000000, 159.8900000000], [0.0000000000, 170.1100000000], [4.9000000000, 170.1100000000], [4.9000000000, 179.8900000000], [0.0000000000, 179.8900000000], [0.0000000000, 190.1100000000], [4.9000000000, 190.1100000000], [4.9000000000, 199.8900000000], [0.0000000000, 199.8900000000], [0.0000000000, 210.1100000000], [4.9000000000, 210.1100000000], [4.9000000000, 219.8900000000], [0.0000000000, 219.8900000000], [0.0000000000, 230.1100000000], [4.9000000000, 230.1100000000], [4.9000000000, 239.8900000000], [0.0000000000, 239.8900000000], [0.0000000000, 250.1100000000], [4.9000000000, 250.1100000000], [4.9000000000, 259.8900000000], [0.0000000000, 259.8900000000], [0.0000000000, 270.1100000000], [4.9000000000, 270.1100000000], [4.9000000000, 279.8900000000], [0.0000000000, 279.8900000000], [0.0000000000, 290.1100000000], [4.9000000000, 290.1100000000], [4.9000000000, 300.0000000000], [75.1000000000, 300.0000000000]]);
								}
							}
						}
					}
				}
			}
		}
	}
}
